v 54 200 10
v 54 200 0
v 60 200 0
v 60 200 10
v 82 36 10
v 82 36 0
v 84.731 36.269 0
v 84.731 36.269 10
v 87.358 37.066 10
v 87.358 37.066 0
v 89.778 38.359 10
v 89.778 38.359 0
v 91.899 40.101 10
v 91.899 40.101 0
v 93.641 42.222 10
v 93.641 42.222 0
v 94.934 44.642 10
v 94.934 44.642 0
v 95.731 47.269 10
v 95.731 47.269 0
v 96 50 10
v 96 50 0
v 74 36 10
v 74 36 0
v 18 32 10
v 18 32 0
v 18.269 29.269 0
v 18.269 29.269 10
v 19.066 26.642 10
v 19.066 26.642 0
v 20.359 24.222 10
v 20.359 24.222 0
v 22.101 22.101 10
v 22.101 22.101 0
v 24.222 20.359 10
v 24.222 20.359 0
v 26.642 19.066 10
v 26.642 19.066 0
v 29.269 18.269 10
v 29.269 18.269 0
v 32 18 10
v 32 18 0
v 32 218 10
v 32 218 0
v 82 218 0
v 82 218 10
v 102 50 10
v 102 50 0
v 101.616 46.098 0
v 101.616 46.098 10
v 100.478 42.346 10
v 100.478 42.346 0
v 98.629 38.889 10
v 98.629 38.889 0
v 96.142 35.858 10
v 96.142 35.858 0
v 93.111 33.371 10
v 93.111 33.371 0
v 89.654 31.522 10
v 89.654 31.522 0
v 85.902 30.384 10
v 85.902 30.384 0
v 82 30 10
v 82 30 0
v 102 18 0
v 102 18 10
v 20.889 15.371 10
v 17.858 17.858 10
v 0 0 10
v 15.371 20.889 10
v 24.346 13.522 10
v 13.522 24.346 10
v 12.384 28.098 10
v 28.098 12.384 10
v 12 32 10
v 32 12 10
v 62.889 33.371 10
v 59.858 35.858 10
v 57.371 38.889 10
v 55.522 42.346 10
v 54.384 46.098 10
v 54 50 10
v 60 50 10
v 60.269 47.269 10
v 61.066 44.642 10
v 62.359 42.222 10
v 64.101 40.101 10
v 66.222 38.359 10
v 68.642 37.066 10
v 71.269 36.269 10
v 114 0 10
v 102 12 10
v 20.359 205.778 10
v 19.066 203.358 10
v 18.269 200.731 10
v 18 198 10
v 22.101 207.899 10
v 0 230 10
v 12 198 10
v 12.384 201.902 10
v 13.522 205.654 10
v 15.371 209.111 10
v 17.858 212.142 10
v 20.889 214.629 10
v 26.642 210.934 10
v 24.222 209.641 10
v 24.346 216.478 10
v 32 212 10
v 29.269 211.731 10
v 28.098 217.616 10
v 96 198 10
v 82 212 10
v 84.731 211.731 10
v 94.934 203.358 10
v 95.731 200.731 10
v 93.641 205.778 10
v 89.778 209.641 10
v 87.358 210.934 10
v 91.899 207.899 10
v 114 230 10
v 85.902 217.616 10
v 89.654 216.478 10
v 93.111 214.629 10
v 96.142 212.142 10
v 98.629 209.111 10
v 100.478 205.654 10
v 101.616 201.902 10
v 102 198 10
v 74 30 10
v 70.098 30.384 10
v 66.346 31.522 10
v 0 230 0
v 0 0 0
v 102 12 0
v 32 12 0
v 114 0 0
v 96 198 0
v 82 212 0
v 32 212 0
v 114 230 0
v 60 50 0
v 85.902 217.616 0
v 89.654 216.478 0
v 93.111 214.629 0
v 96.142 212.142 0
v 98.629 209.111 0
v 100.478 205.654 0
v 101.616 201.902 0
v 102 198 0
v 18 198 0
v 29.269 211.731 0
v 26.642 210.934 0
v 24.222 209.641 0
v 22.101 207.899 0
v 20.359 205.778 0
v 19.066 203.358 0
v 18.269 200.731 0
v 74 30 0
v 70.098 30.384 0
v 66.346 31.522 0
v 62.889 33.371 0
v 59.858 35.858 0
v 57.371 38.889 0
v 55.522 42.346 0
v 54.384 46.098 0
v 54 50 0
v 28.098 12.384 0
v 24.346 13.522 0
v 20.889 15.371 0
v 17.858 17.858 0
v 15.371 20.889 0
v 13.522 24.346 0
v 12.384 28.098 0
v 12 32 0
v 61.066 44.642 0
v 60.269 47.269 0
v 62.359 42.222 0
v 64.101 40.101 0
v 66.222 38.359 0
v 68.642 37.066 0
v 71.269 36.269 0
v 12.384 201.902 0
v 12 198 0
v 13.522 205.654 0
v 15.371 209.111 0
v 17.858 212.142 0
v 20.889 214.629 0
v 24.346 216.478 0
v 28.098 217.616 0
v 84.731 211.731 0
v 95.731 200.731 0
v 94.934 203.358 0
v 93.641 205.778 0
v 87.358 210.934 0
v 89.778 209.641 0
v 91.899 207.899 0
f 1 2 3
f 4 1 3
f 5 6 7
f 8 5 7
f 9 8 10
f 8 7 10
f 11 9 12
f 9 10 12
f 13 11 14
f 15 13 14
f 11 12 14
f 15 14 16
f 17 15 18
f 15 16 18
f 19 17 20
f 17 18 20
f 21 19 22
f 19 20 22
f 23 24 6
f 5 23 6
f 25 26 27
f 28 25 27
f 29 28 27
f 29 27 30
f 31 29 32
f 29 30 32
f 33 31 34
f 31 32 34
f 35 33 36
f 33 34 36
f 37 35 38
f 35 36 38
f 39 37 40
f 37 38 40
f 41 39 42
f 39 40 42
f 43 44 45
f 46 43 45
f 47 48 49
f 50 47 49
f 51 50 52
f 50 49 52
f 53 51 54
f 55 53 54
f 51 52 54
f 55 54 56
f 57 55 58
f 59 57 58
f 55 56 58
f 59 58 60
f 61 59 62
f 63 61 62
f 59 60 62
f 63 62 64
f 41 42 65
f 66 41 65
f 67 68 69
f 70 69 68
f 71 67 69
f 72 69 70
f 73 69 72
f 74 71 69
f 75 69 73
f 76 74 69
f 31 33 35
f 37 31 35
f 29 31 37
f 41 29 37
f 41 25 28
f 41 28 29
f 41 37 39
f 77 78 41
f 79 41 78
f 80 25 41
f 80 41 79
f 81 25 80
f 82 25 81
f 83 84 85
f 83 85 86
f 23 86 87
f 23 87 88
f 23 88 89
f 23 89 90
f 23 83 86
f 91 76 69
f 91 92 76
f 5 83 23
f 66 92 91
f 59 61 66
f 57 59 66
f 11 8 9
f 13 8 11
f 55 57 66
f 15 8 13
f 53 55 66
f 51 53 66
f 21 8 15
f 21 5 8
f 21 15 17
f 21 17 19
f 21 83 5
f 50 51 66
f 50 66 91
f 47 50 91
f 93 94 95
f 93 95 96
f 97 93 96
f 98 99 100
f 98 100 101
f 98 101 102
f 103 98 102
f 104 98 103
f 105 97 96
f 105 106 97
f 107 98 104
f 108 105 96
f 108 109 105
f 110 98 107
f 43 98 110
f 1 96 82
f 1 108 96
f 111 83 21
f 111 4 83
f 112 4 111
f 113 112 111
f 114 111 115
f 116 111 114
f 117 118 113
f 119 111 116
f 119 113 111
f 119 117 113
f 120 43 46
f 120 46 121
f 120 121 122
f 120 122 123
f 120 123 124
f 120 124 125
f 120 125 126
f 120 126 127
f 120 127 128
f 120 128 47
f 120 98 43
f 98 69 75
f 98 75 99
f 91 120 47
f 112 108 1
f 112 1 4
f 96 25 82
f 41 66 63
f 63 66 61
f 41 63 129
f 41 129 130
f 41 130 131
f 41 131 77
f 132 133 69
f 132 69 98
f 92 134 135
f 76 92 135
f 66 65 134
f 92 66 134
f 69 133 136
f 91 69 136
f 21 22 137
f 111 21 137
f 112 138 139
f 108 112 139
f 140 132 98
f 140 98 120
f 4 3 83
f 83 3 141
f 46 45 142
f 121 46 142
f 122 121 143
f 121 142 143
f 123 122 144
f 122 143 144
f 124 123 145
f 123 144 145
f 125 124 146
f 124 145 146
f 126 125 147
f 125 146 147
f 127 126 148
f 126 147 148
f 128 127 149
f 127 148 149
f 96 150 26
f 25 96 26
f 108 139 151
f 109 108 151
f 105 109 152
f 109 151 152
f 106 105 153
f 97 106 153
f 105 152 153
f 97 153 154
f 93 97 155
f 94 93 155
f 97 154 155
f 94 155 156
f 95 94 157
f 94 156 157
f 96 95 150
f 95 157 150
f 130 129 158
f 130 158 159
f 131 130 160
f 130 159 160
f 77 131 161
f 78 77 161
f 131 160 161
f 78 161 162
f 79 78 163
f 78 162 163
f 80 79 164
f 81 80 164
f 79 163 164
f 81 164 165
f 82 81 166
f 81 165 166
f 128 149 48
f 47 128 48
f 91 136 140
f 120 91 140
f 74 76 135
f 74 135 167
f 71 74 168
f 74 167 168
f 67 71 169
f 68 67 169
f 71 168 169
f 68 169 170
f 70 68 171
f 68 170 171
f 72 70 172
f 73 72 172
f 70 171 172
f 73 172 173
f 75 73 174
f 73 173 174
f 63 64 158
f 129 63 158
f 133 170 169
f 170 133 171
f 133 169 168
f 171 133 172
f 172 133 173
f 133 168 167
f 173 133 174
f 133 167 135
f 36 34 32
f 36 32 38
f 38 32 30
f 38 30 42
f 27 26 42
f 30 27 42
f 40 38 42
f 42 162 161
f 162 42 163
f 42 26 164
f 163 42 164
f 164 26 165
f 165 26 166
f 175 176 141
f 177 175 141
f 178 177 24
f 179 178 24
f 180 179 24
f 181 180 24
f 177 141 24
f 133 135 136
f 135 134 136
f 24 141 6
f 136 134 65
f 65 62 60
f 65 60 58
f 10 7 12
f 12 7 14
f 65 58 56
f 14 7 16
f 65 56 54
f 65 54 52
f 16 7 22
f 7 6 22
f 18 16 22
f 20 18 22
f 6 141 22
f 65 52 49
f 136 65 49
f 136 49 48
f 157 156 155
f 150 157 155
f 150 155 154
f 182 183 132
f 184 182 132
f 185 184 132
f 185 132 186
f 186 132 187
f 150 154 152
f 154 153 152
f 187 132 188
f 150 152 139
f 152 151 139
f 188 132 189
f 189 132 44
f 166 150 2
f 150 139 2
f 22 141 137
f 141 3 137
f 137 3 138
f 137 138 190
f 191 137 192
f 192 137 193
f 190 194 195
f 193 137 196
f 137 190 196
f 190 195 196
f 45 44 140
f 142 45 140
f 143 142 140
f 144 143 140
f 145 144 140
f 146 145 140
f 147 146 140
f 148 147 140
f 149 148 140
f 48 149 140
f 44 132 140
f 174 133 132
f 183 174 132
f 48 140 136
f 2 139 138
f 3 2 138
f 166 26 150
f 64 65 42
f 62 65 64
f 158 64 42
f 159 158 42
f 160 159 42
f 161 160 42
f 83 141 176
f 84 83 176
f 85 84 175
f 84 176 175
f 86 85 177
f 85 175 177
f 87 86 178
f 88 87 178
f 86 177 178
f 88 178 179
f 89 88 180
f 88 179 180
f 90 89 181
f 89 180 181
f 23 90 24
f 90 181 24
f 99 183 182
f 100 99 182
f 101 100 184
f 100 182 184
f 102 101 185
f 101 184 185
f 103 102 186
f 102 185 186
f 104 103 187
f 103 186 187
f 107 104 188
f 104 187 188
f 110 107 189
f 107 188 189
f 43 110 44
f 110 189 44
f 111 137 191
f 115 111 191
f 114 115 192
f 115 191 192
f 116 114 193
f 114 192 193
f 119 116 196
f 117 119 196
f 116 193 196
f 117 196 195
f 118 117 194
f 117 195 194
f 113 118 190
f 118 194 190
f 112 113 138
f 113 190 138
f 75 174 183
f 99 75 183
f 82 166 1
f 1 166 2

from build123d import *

# Parameters (mm, degrees)
F0_W     = 114
F0_H     = 230
F1_DEPTH = 10


with BuildPart() as f1:
    # F0 (on Top) → F1 (new body)
    with BuildSketch(Plane.XY):
        with Locations((57, 115)):
            Rectangle(F0_W, F0_H)
        with BuildLine():
            Line((12, 32), (12, 198))
            ThreePointArc((12, 198), (17.857864, 212.142136), (32, 218))
            Line((32, 218), (82, 218))
            ThreePointArc((82, 218), (96.142136, 212.142136), (102, 198))
            Line((102, 198), (102, 50))
            ThreePointArc((102, 50), (96.142136, 35.857864), (82, 30))
            Line((82, 30), (74, 30))
            ThreePointArc((74, 30), (59.857864, 35.857864), (54, 50))
            Line((54, 50), (54, 200))
            Line((54, 200), (60, 200))
            Line((60, 200), (60, 50))
            ThreePointArc((60, 50), (64.100505, 40.100505), (74, 36))
            Line((74, 36), (82, 36))
            ThreePointArc((82, 36), (91.899495, 40.100505), (96, 50))
            Line((96, 50), (96, 198))
            ThreePointArc((96, 198), (91.899495, 207.899495), (82, 212))
            Line((82, 212), (32, 212))
            ThreePointArc((32, 212), (22.100505, 207.899495), (18, 198))
            Line((18, 198), (18, 32))
            ThreePointArc((18, 32), (22.100505, 22.100505), (32, 18))
            Line((32, 18), (102, 18))
            Line((102, 18), (102, 12))
            Line((102, 12), (82, 12))
            Line((82, 12), (32, 12))
            ThreePointArc((32, 12), (17.857864, 17.857864), (12, 32))
        make_face(mode=Mode.SUBTRACT)
    extrude(amount=F1_DEPTH)


solid = f1.part
